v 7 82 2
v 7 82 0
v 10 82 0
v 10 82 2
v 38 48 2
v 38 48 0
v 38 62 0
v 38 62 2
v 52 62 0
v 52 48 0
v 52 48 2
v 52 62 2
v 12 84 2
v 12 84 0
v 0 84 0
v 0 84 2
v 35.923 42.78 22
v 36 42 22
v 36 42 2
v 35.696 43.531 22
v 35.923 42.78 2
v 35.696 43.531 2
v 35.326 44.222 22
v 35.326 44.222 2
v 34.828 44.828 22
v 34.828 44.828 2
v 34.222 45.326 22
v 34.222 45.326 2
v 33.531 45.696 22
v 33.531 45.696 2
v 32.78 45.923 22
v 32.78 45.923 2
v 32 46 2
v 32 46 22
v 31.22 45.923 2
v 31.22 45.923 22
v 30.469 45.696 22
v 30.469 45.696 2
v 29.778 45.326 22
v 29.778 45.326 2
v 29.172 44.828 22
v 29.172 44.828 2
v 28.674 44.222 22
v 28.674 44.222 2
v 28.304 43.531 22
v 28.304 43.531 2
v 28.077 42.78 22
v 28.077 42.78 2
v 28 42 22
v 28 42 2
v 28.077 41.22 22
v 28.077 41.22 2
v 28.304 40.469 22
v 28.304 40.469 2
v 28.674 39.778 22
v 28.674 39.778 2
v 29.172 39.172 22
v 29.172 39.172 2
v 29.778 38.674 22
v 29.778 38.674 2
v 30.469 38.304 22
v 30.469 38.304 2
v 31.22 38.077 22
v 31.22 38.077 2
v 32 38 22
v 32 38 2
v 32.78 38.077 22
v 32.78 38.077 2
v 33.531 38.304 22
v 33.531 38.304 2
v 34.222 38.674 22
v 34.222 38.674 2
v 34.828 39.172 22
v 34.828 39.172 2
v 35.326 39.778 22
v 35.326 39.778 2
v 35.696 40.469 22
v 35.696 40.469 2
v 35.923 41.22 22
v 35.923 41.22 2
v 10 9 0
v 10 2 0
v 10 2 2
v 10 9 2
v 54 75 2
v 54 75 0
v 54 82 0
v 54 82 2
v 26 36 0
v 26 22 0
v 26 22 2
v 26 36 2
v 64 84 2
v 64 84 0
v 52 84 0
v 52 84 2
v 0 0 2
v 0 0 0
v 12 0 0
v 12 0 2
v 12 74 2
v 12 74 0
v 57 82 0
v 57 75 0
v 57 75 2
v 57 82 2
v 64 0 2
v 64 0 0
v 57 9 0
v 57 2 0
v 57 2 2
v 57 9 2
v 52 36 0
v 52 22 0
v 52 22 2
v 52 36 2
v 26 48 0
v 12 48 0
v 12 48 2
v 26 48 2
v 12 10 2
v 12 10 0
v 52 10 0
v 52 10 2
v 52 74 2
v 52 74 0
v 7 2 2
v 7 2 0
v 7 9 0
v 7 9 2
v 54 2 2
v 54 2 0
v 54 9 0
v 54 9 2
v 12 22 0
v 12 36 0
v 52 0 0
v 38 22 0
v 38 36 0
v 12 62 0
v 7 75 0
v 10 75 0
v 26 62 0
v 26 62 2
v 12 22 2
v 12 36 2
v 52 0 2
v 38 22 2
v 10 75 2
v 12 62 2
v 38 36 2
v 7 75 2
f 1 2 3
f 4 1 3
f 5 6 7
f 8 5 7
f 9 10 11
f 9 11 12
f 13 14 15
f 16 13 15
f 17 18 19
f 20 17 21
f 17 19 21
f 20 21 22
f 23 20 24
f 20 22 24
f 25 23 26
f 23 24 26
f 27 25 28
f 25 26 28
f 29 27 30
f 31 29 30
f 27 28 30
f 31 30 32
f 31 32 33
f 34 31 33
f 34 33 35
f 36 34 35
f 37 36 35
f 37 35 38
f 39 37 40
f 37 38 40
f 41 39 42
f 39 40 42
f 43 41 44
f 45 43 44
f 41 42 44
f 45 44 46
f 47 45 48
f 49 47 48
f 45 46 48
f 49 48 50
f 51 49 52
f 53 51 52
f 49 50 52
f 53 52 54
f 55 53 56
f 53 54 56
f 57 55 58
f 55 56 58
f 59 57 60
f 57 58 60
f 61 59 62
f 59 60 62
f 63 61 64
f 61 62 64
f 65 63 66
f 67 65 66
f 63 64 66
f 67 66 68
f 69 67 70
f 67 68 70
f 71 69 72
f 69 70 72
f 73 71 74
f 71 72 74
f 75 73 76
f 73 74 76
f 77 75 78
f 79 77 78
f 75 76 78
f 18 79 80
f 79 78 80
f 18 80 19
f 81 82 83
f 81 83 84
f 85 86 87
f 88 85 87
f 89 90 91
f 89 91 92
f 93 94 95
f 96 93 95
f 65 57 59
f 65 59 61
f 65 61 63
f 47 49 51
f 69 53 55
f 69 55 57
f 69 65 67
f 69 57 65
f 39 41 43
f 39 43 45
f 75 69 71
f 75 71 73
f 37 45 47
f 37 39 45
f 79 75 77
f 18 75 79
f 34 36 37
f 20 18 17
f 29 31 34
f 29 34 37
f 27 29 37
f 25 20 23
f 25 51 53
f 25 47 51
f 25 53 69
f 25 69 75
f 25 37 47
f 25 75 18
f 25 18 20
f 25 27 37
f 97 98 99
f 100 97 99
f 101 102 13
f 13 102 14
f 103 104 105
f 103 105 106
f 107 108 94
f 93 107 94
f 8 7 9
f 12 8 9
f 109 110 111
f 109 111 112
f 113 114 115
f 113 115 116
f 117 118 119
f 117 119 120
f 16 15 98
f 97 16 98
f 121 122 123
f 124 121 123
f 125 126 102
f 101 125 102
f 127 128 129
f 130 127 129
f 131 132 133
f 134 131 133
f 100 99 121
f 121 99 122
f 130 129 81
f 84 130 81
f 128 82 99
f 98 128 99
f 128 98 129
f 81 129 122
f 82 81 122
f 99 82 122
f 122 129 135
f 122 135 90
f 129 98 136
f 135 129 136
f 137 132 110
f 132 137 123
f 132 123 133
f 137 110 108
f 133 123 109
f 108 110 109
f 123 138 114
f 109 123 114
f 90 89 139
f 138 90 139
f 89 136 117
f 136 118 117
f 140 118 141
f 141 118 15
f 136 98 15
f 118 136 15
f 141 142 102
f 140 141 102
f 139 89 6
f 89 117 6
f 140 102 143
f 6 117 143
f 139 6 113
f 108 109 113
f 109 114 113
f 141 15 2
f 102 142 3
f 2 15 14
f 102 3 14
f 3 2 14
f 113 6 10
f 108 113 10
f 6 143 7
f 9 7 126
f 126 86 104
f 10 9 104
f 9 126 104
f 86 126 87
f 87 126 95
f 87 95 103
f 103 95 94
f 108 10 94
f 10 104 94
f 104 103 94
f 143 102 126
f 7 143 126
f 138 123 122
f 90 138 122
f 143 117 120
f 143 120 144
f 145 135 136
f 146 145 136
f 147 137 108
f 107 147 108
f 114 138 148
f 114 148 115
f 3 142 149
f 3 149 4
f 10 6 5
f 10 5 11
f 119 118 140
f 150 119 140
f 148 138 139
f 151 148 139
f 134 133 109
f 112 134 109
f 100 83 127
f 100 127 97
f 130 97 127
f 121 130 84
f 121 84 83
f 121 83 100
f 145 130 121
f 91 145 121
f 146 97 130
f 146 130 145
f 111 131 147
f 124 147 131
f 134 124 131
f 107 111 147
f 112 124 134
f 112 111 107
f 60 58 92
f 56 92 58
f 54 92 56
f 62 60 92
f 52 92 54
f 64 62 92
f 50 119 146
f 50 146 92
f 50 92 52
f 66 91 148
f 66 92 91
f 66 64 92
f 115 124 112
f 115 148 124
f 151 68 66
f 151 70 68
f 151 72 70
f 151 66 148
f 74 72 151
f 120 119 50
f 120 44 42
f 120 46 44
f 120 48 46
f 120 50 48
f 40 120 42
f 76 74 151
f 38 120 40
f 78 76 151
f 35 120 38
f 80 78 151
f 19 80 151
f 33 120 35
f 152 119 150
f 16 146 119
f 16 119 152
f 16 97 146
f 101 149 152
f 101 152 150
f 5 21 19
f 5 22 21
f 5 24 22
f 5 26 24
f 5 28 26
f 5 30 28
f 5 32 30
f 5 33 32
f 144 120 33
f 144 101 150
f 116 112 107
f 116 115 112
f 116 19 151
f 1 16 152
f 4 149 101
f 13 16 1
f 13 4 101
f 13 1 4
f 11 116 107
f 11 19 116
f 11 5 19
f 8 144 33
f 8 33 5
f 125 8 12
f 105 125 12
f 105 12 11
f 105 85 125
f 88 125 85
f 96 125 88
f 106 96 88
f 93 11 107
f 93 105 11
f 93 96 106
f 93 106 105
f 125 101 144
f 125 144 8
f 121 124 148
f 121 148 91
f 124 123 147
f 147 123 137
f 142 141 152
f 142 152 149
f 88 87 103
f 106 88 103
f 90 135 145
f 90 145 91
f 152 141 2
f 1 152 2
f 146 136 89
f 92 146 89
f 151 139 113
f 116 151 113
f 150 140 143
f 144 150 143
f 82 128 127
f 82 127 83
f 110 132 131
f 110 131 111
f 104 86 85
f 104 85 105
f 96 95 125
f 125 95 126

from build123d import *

# Parameters (mm, degrees)
SKETCH_W     = 14
SKETCH_H     = 14
SKETCH_W_2   = 3
SKETCH_H_2   = 7
PAD_DEPTH    = 2
SKETCH006_R  = 4
PAD001_DEPTH = 20


with BuildPart() as part:
    # Sketch → Pad (new body)
    with BuildSketch(Plane.XY):
        Polygon((64, 0), (64, 84), (52, 84), (52, 74), (12, 74), (12, 84), (0, 84), (0, 0), (12, 0), (12, 10), (52, 10), (52, 0), align=None)
        with Locations((19, 55)):
            Rectangle(SKETCH_W, SKETCH_H, mode=Mode.SUBTRACT)
        with Locations((45, 55)):
            Rectangle(SKETCH_W, SKETCH_H, mode=Mode.SUBTRACT)
        with Locations((19, 29)):
            Rectangle(SKETCH_W, SKETCH_H, mode=Mode.SUBTRACT)
        with Locations((45, 29)):
            Rectangle(SKETCH_W, SKETCH_H, mode=Mode.SUBTRACT)
        with Locations((8.5, 5.5)):
            Rectangle(SKETCH_W_2, SKETCH_H_2, mode=Mode.SUBTRACT)
        with Locations((55.5, 5.5)):
            Rectangle(SKETCH_W_2, SKETCH_H_2, mode=Mode.SUBTRACT)
        with Locations((55.5, 78.5)):
            Rectangle(SKETCH_W_2, SKETCH_H_2, mode=Mode.SUBTRACT)
        with Locations((8.5, 78.5)):
            Rectangle(SKETCH_W_2, SKETCH_H_2, mode=Mode.SUBTRACT)
    extrude(amount=PAD_DEPTH)

    # Sketch006 → Pad001 (join)
    with BuildSketch(Plane.XY.offset(2)):
        with Locations((32, 42)):
            Circle(SKETCH006_R)
    extrude(amount=PAD001_DEPTH)


solid = part.part
